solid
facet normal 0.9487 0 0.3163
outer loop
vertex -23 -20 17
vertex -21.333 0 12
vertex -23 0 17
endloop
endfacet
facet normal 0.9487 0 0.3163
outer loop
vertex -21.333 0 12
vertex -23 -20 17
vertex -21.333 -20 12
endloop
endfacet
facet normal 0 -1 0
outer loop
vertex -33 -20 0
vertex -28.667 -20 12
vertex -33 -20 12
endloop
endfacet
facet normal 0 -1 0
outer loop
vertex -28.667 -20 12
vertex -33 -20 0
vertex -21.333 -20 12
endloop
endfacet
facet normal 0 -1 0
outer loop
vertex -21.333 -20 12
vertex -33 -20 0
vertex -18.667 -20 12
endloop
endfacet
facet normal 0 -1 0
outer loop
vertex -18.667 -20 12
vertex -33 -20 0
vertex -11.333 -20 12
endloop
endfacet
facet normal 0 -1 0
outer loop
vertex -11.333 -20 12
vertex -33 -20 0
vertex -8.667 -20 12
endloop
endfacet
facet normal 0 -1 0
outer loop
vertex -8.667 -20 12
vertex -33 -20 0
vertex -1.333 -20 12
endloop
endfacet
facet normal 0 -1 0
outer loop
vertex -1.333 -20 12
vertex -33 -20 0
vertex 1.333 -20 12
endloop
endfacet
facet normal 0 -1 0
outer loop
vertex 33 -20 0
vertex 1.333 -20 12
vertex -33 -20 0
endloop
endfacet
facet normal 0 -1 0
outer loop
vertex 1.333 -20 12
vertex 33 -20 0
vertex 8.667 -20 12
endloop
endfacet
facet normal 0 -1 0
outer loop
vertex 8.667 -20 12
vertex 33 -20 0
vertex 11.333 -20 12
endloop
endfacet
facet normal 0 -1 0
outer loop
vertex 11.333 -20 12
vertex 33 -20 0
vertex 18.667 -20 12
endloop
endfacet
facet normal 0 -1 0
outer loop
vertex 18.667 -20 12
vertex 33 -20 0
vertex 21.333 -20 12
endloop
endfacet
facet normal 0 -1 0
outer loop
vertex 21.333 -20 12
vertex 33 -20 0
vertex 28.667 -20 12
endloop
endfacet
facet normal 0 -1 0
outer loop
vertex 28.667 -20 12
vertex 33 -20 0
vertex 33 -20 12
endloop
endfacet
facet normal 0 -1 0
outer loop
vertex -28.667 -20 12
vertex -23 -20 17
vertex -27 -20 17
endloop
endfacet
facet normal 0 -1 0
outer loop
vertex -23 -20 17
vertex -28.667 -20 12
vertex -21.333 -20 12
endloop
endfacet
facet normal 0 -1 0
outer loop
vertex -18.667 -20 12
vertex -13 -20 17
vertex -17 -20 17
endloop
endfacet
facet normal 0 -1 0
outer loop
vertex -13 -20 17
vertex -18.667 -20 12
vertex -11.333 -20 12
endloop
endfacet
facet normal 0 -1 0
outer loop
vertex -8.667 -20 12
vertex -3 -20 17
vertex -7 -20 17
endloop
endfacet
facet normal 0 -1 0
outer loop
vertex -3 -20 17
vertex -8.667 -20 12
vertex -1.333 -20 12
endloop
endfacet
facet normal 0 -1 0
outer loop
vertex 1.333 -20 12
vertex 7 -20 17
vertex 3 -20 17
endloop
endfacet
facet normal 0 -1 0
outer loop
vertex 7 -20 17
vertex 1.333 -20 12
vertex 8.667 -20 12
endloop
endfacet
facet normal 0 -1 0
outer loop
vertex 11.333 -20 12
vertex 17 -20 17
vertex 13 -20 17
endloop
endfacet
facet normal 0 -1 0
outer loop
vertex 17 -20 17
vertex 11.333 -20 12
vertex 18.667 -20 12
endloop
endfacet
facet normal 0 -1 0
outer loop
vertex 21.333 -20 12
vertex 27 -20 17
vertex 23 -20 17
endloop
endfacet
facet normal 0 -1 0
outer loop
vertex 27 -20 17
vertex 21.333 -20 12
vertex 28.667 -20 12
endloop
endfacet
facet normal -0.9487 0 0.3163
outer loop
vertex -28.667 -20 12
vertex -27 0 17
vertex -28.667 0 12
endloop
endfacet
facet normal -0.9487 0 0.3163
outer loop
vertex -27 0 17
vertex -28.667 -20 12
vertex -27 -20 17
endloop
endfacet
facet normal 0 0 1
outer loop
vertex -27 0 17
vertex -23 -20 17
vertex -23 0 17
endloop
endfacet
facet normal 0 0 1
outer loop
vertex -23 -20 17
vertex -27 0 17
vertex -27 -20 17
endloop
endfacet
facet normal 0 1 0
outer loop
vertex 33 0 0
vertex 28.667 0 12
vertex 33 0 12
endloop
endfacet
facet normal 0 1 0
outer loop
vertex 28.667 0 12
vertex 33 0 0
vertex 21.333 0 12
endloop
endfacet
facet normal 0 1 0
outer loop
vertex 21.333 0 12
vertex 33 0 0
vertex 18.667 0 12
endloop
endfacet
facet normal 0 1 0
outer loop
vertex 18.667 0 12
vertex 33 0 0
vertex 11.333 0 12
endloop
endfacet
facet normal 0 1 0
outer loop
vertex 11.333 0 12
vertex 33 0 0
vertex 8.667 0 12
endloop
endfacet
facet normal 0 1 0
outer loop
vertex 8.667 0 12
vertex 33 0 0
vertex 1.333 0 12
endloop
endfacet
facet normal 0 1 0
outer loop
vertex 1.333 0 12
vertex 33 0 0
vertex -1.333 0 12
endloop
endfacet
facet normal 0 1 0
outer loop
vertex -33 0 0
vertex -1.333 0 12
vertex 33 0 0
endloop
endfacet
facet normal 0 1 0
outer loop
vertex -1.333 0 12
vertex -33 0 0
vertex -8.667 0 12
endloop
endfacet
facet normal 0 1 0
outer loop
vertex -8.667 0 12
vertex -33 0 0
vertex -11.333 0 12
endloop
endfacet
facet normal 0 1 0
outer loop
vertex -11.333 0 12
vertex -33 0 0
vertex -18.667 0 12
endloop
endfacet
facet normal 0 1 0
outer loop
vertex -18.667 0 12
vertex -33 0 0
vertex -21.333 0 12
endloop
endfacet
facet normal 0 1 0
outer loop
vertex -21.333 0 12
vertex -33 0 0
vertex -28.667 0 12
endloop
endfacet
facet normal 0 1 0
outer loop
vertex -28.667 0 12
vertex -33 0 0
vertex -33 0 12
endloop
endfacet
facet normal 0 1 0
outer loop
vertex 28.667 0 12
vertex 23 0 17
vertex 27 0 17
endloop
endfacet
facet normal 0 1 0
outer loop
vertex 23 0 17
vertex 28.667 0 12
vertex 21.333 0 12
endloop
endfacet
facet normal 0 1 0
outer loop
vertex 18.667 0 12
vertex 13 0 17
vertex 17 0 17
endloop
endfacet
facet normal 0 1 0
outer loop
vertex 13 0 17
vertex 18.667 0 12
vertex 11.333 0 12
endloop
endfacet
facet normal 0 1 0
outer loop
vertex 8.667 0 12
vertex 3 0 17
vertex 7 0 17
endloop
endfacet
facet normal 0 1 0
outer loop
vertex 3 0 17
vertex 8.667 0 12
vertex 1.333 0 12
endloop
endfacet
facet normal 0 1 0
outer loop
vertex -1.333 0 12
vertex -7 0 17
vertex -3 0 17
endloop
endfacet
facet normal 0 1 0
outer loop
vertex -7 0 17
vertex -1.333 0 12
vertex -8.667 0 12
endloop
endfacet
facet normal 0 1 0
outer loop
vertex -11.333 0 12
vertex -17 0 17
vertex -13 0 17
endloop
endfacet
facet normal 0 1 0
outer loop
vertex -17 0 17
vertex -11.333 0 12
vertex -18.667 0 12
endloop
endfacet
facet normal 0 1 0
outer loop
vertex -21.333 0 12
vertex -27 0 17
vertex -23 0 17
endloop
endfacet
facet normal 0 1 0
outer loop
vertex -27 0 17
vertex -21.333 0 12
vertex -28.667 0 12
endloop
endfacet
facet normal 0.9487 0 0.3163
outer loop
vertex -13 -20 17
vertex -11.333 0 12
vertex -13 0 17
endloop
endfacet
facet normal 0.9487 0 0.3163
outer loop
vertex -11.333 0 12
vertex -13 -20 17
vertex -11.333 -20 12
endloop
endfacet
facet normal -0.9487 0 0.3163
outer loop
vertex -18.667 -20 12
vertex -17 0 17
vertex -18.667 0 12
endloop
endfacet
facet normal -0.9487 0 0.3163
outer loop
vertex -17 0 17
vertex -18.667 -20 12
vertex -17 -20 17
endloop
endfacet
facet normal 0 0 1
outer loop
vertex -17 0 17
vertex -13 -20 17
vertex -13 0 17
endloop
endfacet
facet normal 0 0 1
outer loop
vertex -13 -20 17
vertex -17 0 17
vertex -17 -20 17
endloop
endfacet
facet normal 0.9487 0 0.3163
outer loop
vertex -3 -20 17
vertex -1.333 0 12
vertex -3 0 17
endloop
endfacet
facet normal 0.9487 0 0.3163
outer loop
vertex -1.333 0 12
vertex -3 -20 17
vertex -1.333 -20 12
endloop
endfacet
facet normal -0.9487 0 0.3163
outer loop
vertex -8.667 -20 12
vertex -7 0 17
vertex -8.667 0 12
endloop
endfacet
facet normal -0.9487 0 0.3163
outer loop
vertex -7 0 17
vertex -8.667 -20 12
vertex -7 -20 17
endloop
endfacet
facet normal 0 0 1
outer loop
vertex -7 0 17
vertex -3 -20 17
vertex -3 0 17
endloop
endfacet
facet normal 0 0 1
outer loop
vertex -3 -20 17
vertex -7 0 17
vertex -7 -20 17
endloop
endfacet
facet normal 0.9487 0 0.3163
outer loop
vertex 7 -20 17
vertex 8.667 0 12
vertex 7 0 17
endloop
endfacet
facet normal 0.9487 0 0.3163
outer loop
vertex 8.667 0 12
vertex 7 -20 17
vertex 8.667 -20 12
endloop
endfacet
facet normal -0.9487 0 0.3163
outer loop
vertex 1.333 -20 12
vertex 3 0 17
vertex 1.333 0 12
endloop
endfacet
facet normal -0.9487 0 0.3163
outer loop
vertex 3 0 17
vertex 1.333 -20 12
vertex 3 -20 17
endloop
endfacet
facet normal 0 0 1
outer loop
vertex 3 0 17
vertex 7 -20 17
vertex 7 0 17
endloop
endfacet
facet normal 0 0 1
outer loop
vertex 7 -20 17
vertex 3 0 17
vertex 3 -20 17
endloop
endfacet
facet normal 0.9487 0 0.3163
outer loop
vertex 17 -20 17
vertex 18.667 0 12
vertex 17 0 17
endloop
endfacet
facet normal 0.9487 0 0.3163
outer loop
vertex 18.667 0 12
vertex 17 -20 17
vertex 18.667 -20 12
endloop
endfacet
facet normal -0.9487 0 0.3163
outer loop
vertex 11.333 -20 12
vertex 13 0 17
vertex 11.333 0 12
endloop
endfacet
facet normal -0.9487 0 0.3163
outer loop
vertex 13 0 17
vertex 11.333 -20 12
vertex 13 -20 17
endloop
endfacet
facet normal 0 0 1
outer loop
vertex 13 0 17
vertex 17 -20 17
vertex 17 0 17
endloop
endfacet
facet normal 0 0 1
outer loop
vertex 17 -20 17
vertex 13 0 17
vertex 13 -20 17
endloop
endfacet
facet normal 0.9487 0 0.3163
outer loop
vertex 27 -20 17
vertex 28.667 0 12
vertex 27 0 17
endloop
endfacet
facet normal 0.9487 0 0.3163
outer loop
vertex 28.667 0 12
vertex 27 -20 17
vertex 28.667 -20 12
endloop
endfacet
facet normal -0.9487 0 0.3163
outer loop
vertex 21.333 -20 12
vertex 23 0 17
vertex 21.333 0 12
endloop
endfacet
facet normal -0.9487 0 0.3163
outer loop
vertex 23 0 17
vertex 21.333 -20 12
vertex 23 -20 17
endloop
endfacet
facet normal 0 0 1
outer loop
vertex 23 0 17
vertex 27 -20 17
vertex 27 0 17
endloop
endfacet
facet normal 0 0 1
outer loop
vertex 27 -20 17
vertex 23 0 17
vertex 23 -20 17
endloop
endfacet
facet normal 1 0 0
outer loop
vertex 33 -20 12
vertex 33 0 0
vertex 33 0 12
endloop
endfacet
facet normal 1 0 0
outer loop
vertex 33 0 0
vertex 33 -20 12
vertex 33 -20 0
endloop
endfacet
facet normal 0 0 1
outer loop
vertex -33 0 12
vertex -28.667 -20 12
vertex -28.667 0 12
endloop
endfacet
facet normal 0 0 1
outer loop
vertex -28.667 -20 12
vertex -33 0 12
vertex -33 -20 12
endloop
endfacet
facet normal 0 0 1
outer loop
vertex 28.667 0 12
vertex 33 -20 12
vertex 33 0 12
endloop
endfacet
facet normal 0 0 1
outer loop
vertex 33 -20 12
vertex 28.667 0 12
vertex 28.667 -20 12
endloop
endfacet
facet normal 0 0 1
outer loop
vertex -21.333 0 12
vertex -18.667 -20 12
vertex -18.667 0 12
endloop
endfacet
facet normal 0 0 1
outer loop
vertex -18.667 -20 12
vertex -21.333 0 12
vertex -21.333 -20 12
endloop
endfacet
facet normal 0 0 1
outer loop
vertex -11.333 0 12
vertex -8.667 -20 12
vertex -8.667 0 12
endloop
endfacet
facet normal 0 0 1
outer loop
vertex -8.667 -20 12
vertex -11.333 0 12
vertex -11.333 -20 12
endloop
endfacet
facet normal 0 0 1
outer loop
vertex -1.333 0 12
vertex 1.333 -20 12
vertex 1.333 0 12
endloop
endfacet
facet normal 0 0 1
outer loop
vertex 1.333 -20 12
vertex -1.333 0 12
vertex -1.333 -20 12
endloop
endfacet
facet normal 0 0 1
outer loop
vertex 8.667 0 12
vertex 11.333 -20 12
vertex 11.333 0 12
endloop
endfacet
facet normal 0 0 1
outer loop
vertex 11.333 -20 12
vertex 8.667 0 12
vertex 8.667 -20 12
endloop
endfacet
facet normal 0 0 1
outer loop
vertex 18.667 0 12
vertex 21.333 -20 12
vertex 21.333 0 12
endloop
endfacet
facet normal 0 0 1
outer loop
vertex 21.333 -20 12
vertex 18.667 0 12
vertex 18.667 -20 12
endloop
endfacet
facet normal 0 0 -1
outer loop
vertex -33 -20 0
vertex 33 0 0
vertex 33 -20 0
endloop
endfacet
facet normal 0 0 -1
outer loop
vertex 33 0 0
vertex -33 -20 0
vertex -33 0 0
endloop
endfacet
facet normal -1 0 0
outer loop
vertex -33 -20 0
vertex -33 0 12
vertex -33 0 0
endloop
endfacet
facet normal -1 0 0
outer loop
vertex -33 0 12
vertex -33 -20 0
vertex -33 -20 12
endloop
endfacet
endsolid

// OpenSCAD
$fn = 32;

// ----------------------------------------------------------------------
// Toothed rack, 6 teeth
// 10 mm pitch, 5 mm teeth
// ----------------------------------------------------------------------

// --- parameters (mm) ---
bar_w = 20;   // bar width (Y)
bar_h = 12;   // bar height (Z)
teeth = 6;    // number of teeth
pitch = 10;   // tooth pitch
tooth_h = 5;  // tooth height above the bar
root_w = 8;   // tooth width at the root
crest_w = 4;  // tooth width at the crest

// --- derived feature positions (mm) ---
span = (teeth - 1) * pitch;  // = 50   distance between the outer teeth
bar_l = span + root_w + 8;   // = 66   bar length: teeth plus 4 mm at each end
tooth_x = -span / 2;         // = -25   X of the first tooth
height = bar_h + tooth_h;    // = 17   overall height
feature_centers = [
  [tooth_x + 0 * pitch, -bar_w / 2],
  [tooth_x + 1 * pitch, -bar_w / 2],
  [tooth_x + 2 * pitch, -bar_w / 2],
  [tooth_x + 3 * pitch, -bar_w / 2],
  [tooth_x + 4 * pitch, -bar_w / 2],
  [tooth_x + 5 * pitch, -bar_w / 2]
];   // tooth centre line, drives the tooth loop

// bar with a rack of teeth, one extruded trapezoium per centre
module rack_tooth() {
  linear_extrude(height = bar_w)
    polygon(points = [
      [0, 0],
      [root_w, 0],
      [root_w / 2 + crest_w / 2, tooth_h + 1],
      [root_w / 2 - crest_w / 2, tooth_h + 1]
    ]);
}

union() {
  translate([-bar_l / 2, -bar_w, 0]) cube([bar_l, bar_w, bar_h]);
  for (centre = feature_centers)
    translate([centre[0] - root_w / 2, 0, bar_h - 1]) rotate([90, 0, 0]) rack_tooth();
}
